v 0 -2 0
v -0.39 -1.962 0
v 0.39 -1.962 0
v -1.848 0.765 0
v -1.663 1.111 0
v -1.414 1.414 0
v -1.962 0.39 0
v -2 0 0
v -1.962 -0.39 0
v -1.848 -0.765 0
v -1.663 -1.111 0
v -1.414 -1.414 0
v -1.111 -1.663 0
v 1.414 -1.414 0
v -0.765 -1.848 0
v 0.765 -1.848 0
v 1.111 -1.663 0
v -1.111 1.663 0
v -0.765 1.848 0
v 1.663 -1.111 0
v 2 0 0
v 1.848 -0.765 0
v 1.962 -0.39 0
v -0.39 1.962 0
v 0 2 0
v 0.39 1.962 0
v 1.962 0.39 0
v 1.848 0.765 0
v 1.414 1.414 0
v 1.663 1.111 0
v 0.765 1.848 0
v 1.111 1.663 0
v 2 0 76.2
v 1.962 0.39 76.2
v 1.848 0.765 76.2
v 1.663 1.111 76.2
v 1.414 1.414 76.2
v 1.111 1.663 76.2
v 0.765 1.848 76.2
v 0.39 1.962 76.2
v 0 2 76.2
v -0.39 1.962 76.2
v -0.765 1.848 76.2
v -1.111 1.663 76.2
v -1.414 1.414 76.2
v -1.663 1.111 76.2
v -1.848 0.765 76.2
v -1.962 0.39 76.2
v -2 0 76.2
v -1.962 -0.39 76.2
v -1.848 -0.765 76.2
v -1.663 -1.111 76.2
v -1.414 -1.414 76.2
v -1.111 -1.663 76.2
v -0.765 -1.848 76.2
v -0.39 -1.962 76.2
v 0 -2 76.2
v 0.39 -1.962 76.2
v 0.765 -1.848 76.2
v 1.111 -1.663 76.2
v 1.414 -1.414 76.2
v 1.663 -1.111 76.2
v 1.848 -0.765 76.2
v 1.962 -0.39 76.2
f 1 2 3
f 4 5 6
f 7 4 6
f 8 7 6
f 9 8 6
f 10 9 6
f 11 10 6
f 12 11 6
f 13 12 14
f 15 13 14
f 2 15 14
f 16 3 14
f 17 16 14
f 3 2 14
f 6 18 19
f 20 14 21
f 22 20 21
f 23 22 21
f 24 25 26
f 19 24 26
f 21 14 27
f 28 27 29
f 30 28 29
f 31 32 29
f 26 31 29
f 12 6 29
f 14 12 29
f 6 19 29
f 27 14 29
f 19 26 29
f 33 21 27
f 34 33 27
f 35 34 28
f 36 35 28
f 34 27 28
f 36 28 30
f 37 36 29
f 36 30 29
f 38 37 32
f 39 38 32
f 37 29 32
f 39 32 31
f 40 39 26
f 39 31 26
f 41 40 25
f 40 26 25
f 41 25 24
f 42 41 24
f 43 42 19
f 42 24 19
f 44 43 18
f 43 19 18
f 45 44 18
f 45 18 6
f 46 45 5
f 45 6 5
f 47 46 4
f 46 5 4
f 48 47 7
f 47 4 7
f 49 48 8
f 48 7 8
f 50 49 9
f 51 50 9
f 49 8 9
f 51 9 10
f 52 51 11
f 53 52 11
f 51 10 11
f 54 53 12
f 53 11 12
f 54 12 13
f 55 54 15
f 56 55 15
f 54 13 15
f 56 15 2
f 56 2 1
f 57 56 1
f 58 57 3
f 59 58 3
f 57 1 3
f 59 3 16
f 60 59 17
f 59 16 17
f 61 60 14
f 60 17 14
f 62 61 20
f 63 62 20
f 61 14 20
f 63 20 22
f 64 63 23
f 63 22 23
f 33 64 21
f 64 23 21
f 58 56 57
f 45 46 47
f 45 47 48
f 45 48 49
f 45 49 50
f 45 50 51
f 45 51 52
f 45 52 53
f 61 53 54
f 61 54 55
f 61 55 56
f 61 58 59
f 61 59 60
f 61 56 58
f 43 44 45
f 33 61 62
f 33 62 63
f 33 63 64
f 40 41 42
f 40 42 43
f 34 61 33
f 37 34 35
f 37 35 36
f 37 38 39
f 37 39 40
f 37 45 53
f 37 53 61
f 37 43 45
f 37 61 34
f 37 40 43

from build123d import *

# Parameters (mm, degrees)
F0_R     = 26.3604411939
F1_DEPTH = 100.000054
F3_R     = 1.999996
F4_DEPTH = 76.2


with BuildPart() as f1:
    # F0 (on Top) → F1 (new body)
    with BuildSketch(Plane.XY):
        Circle(F0_R)
    extrude(amount=F1_DEPTH)


with BuildPart() as f4:
    # F3 (on Top) → F4 (new body)
    with BuildSketch(Plane.XY):
        Circle(F3_R)
    extrude(amount=F4_DEPTH)


solid = f4.part
